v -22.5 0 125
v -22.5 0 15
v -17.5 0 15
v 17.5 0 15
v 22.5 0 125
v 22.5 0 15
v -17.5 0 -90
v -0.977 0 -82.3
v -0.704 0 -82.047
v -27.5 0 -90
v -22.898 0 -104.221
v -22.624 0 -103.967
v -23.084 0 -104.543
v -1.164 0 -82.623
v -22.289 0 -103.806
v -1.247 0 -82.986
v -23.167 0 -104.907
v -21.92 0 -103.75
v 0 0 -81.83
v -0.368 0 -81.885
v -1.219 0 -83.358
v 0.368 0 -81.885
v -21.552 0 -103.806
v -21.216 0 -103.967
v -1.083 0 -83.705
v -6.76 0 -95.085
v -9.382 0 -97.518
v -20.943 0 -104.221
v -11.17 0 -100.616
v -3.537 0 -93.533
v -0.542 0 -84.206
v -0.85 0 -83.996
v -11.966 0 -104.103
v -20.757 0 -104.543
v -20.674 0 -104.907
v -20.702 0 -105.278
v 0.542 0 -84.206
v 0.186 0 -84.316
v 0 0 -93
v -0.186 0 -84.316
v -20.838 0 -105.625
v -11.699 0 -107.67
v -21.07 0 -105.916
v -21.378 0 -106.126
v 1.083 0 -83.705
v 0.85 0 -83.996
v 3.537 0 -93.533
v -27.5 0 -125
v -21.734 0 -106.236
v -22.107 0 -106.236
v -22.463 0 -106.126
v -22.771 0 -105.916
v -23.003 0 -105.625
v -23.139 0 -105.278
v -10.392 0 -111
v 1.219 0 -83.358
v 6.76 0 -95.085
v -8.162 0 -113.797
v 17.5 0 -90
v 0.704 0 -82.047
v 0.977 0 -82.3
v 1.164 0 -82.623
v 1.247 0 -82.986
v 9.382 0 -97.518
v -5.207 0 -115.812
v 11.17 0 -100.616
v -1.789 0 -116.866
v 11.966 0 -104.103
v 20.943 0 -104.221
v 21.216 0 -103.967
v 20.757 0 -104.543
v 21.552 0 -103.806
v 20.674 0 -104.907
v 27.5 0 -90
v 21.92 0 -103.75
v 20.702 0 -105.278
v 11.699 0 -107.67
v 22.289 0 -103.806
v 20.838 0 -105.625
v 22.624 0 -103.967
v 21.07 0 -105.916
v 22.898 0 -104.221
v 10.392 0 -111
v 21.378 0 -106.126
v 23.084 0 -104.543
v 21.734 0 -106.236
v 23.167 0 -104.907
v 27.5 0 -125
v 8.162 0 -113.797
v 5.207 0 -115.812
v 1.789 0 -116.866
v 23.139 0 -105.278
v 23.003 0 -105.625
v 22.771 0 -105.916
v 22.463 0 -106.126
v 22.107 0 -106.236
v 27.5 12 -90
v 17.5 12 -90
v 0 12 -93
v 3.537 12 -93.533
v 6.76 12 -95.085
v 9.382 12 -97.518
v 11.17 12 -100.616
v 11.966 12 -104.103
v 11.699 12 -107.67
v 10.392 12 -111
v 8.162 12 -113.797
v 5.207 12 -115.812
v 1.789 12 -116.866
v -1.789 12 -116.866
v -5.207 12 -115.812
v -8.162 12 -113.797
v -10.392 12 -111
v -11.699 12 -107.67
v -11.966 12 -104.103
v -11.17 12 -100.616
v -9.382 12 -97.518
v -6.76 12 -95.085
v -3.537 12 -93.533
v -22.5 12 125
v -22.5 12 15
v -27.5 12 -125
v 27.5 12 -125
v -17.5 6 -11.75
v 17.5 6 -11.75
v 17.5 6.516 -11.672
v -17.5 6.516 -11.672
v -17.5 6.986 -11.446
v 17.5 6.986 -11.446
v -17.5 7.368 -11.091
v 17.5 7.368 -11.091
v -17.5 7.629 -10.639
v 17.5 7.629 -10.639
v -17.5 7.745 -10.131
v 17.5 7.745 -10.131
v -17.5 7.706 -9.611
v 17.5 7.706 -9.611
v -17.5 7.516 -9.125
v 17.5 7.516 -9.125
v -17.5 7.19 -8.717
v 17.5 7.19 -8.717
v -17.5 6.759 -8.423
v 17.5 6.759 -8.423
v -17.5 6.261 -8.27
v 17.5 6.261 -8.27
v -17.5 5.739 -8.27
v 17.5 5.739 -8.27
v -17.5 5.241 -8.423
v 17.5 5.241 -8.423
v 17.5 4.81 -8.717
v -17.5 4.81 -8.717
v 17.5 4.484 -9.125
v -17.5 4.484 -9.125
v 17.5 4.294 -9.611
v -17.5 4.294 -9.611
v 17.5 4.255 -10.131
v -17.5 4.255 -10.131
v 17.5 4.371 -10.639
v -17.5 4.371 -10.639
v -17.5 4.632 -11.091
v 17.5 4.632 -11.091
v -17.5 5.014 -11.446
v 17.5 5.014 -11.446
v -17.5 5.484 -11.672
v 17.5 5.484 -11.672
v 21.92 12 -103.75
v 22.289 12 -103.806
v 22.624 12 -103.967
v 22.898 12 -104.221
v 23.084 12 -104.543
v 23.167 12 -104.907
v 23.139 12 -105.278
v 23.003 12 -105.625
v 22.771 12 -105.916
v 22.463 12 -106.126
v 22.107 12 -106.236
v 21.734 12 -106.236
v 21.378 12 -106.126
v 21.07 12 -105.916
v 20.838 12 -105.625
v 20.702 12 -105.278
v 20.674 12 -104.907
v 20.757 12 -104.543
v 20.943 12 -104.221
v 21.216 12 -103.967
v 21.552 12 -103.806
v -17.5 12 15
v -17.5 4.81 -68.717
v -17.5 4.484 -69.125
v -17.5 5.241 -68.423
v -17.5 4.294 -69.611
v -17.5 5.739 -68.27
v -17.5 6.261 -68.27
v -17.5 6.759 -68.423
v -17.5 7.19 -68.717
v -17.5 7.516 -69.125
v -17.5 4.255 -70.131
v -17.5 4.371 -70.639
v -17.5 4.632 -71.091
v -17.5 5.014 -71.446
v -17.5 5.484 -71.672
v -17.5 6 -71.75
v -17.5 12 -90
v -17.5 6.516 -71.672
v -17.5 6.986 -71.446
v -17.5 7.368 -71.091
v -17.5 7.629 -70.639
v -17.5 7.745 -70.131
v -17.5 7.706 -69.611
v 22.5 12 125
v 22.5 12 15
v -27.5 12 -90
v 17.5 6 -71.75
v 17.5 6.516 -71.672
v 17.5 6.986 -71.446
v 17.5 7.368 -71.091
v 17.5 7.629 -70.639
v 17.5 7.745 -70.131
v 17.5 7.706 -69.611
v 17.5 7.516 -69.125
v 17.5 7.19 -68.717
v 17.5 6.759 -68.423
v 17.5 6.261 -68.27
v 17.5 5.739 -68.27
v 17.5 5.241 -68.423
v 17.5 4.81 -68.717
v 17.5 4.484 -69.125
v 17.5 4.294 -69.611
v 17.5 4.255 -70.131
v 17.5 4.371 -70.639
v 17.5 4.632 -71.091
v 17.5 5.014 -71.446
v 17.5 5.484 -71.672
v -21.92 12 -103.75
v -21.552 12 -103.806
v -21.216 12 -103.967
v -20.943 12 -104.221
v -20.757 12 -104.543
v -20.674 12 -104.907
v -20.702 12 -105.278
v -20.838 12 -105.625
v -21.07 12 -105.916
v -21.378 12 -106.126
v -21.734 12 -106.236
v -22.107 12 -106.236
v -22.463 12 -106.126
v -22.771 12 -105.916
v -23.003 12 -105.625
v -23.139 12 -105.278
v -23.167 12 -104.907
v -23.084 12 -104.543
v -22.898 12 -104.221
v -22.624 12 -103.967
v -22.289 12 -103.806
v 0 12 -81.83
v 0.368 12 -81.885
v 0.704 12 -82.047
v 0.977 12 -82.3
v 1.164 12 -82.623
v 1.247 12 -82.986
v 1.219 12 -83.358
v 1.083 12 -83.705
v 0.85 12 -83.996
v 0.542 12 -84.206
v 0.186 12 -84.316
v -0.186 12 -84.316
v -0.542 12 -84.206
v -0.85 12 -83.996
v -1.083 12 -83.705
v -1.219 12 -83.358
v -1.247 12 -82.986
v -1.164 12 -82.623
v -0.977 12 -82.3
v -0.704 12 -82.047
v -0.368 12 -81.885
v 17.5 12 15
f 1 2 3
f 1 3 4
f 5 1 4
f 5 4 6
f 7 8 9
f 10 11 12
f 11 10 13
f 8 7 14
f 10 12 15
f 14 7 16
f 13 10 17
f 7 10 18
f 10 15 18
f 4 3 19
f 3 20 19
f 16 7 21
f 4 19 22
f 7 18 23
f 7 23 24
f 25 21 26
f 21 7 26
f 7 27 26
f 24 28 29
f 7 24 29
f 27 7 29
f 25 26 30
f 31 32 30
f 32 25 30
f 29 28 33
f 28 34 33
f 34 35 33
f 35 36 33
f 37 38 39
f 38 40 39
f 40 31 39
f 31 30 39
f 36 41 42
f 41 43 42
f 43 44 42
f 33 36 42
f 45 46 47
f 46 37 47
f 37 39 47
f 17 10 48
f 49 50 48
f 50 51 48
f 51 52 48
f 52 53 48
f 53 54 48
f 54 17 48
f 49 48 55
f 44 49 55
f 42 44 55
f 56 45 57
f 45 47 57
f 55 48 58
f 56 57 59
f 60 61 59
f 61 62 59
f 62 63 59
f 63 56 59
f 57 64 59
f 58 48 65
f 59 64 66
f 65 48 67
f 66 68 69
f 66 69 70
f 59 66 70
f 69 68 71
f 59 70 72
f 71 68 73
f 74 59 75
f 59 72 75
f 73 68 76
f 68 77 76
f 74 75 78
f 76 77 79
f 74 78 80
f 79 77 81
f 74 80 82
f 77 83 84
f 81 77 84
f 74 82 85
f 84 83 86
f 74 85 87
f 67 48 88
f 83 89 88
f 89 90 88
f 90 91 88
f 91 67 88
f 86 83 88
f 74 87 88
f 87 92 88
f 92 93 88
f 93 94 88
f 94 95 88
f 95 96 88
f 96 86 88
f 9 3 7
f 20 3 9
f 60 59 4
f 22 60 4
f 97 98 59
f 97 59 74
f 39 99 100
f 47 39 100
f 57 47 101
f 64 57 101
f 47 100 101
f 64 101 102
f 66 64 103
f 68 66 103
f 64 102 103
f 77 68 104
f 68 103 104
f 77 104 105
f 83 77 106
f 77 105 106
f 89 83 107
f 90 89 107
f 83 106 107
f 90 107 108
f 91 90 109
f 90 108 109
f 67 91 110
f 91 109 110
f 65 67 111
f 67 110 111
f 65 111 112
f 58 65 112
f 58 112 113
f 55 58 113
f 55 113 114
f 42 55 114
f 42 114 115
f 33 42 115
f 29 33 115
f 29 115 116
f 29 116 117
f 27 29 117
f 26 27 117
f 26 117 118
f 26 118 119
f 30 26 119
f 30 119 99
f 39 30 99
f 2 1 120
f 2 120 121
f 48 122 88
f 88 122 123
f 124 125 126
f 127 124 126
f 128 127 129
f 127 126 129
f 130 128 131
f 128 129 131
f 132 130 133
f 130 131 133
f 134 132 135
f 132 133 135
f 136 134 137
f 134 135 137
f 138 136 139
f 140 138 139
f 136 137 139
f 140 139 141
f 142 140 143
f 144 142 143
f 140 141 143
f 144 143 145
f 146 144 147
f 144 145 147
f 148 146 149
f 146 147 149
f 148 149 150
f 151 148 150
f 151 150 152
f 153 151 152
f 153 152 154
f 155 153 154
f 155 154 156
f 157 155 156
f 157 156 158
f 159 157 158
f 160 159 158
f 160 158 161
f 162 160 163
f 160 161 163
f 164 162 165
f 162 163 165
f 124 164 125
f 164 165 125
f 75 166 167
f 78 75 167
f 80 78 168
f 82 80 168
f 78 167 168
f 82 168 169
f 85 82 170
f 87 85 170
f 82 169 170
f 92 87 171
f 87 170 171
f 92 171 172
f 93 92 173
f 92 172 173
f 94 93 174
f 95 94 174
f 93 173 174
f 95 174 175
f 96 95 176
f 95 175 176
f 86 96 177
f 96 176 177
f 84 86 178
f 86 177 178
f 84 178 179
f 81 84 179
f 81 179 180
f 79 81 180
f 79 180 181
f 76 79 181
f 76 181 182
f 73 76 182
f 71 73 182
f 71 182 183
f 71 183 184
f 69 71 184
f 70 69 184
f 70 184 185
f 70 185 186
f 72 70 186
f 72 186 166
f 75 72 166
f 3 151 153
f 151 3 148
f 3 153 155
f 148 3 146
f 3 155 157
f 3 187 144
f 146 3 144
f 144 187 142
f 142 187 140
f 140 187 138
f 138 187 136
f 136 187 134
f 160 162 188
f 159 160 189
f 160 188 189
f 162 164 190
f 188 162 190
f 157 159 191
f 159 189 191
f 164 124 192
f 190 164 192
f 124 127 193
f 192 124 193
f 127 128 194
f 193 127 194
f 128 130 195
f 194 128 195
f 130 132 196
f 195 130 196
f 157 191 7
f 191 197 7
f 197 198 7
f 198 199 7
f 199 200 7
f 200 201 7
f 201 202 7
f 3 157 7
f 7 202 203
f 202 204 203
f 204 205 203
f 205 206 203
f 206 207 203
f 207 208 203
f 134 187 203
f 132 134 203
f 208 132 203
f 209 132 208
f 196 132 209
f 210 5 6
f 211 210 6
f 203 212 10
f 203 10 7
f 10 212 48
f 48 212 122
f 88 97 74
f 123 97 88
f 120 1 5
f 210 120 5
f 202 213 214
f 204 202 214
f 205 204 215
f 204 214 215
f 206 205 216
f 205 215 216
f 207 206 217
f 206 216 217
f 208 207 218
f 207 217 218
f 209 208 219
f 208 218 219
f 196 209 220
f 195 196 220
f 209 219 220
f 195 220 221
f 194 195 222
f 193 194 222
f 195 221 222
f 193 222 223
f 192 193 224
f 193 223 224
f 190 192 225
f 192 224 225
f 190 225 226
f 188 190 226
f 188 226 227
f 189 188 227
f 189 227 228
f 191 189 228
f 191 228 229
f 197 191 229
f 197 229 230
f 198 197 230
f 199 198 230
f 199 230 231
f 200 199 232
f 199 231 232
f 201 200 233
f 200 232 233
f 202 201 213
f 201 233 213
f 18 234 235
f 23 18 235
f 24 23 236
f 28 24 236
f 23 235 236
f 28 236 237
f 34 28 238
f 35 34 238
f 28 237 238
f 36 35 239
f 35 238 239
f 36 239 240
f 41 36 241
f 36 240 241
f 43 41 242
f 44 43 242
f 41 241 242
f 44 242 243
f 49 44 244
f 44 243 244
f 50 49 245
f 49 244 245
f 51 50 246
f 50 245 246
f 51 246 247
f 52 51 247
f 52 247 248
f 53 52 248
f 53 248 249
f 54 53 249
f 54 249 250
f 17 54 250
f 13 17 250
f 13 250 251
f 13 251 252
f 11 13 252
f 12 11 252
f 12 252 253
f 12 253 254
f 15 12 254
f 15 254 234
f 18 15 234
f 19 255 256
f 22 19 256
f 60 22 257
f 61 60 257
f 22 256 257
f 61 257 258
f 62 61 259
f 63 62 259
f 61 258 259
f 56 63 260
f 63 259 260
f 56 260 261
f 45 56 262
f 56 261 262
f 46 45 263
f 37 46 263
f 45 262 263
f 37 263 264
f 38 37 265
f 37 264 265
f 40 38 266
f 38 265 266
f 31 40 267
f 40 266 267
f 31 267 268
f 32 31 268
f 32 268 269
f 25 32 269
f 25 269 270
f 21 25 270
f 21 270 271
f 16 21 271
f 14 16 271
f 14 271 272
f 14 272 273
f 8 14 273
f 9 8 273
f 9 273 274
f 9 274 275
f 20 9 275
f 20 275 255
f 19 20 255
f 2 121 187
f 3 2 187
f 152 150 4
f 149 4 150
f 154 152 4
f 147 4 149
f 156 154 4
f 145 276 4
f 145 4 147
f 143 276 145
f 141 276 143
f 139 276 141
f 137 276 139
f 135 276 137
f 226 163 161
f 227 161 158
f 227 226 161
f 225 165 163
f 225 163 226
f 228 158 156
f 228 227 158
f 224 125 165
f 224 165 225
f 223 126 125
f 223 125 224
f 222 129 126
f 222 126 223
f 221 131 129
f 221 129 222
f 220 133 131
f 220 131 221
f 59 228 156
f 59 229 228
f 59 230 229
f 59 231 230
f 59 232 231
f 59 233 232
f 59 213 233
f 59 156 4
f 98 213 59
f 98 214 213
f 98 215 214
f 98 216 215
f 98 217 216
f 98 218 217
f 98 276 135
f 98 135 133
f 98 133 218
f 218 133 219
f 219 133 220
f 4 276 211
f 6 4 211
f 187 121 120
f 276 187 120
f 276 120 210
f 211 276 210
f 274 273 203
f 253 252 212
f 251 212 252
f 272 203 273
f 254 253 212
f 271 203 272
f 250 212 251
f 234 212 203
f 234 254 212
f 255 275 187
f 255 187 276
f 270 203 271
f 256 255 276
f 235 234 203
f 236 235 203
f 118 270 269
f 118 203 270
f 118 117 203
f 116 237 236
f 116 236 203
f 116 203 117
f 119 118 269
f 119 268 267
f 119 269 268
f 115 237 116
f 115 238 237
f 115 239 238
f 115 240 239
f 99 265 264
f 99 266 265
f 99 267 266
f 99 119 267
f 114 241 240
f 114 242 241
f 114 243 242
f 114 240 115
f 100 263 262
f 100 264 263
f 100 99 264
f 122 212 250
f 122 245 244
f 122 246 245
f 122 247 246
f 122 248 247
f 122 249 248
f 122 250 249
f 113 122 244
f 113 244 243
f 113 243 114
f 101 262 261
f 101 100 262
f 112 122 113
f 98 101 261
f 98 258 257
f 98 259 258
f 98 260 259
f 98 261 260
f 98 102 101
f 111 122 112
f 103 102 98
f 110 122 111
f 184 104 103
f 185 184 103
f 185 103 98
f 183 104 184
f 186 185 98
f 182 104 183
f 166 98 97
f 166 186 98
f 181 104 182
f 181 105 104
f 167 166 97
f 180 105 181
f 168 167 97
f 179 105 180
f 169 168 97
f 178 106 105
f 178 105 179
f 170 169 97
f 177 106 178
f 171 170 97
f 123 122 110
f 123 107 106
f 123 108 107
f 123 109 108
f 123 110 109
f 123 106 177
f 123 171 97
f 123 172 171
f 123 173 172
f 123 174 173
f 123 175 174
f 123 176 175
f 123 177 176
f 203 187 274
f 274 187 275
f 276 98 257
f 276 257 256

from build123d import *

# Parameters (mm, degrees)
SKETCH1_W           = 45
SKETCH1_H           = 250
BOSS_EXTRUDE1_DEPTH = 12
SKETCH2_W           = 5
SKETCH2_H           = 105
CUT_EXTRUDE1_DEPTH  = 12
SKETCH3_R           = 1.75
CUT_EXTRUDE2_DEPTH  = 35
SKETCH5_W           = 5
SKETCH5_H           = 35
BOSS_EXTRUDE2_DEPTH = 12
SKETCH7_R           = 12
SKETCH7_R_2         = 1.25
CUT_EXTRUDE3_DEPTH  = 35


with BuildPart() as part:
    # Sketch1 → Boss-Extrude1 (new body)
    with BuildSketch(Plane(origin=(0, 0, 0), x_dir=(1, 0, 0), z_dir=(0, 1, 0))):
        Rectangle(SKETCH1_W, SKETCH1_H)
    extrude(amount=BOSS_EXTRUDE1_DEPTH)

    # Sketch2 → Cut-Extrude1 (cut)
    with BuildSketch(Plane(origin=(0, 12, 0), x_dir=(1, 0, 0), z_dir=(0, 1, 0))):
        with Locations((20, 37.5)):
            Rectangle(SKETCH2_W, SKETCH2_H)
        with Locations((-20, 37.5)):
            Rectangle(SKETCH2_W, SKETCH2_H)
    extrude(amount=-CUT_EXTRUDE1_DEPTH, mode=Mode.SUBTRACT)

    # Sketch3 → Cut-Extrude2 (cut)
    with BuildSketch(Plane(origin=(17.5, 0, 0), x_dir=(0, 0, -1), z_dir=(1, 0, 0))):
        with Locations((10, 6)):
            Circle(SKETCH3_R)
        with Locations((70, 6)):
            Circle(SKETCH3_R)
    extrude(amount=-CUT_EXTRUDE2_DEPTH, mode=Mode.SUBTRACT)

    # Sketch5 → Boss-Extrude2 (add)
    with BuildSketch(Plane(origin=(0, 12, 0), x_dir=(1, 0, 0), z_dir=(0, 1, 0))):
        with Locations((25, 107.5)):
            Rectangle(SKETCH5_W, SKETCH5_H)
        with Locations((-25, 107.5)):
            Rectangle(SKETCH5_W, SKETCH5_H)
    extrude(amount=-BOSS_EXTRUDE2_DEPTH)

    # Sketch7 → Cut-Extrude3 (cut)
    with BuildSketch(Plane(origin=(0, 12, 0), x_dir=(1, 0, 0), z_dir=(0, 1, 0))):
        with Locations(Location((0, 105, 0), (0, 0, 270))):
            Circle(SKETCH7_R)
        with Locations(Location((21.920310217, 105, 0), (0, 0, 270))):
            Circle(SKETCH7_R_2)
        with Locations(Location((-21.920310217, 105, 0), (0, 0, 270))):
            Circle(SKETCH7_R_2)
        with Locations(Location((0, 83.079689783, 0), (0, 0, 270))):
            Circle(SKETCH7_R_2)
    extrude(amount=-CUT_EXTRUDE3_DEPTH, mode=Mode.SUBTRACT)


solid = part.part
